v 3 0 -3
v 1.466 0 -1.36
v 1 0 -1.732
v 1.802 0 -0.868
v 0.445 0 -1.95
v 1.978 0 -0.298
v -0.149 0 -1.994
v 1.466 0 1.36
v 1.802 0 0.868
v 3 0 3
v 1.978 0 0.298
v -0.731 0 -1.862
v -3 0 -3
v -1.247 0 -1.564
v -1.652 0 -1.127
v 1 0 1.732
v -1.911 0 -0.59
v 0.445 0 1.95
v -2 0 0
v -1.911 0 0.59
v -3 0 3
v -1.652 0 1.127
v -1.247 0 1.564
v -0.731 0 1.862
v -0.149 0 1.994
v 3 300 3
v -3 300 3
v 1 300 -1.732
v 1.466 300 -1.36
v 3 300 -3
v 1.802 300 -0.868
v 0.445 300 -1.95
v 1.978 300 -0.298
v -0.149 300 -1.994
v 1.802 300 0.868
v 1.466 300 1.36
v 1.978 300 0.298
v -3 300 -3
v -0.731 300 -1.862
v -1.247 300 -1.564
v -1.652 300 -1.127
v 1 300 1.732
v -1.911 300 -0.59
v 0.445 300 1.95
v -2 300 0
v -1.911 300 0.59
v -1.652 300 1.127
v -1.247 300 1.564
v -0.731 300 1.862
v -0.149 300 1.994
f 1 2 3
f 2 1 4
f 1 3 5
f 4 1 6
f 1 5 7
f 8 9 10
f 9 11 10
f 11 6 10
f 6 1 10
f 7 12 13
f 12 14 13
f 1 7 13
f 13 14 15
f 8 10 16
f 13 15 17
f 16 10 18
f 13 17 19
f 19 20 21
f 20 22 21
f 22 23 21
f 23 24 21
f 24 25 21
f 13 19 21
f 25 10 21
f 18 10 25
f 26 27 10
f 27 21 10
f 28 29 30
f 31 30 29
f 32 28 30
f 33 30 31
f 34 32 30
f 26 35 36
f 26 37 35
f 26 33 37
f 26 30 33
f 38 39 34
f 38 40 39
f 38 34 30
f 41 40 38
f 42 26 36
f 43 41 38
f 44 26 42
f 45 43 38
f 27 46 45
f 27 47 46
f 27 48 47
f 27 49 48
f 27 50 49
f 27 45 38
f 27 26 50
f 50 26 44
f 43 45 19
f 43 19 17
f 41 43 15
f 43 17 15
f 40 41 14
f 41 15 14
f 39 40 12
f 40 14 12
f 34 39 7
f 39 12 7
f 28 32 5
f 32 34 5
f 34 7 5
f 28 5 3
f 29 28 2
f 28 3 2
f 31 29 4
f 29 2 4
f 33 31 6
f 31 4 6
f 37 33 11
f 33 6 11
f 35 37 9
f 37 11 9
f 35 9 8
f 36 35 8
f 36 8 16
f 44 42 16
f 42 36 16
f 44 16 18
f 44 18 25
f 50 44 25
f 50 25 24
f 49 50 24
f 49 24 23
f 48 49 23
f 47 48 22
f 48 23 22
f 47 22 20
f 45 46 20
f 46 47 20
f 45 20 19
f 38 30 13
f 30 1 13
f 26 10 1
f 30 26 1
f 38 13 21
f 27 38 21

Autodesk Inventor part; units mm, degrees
ref_plane "YZ Plane" through (0, 0, 0) normal (1, 0, 0) x (0, 1, 0)
ref_plane "XZ Plane" through (0, 0, 0) normal (0, 1, 0) x (-1, 0, 0)
ref_plane "XY Plane" through (0, 0, 0) normal (0, 0, 1) x (1, 0, 0)
sketch "Sketch1" plane through (0, 0, 0) normal (0, 1, 0) x (-1, 0, 0)
  line L0 (3, 3) -> (-3, 3)
  line L1 (-3, 3) -> (-3, -3)
  line L2 (-3, -3) -> (3, -3)
  line L3 (3, -3) -> (3, 3)
  line L4 (3, 3) -> (-3, -3) construction
  line L5 (-3, 3) -> (3, -3) construction
  circle A0 centre (0, 0) radius 2
  point P0 (0, 0)
  dimension "d0" = 6
  dimension "d1" = 6
  dimension "d2" = 4
extrude "Extrusion1" add sketch "Sketch1" along normal blind 300
properties part number "carbon_fiber_200"
